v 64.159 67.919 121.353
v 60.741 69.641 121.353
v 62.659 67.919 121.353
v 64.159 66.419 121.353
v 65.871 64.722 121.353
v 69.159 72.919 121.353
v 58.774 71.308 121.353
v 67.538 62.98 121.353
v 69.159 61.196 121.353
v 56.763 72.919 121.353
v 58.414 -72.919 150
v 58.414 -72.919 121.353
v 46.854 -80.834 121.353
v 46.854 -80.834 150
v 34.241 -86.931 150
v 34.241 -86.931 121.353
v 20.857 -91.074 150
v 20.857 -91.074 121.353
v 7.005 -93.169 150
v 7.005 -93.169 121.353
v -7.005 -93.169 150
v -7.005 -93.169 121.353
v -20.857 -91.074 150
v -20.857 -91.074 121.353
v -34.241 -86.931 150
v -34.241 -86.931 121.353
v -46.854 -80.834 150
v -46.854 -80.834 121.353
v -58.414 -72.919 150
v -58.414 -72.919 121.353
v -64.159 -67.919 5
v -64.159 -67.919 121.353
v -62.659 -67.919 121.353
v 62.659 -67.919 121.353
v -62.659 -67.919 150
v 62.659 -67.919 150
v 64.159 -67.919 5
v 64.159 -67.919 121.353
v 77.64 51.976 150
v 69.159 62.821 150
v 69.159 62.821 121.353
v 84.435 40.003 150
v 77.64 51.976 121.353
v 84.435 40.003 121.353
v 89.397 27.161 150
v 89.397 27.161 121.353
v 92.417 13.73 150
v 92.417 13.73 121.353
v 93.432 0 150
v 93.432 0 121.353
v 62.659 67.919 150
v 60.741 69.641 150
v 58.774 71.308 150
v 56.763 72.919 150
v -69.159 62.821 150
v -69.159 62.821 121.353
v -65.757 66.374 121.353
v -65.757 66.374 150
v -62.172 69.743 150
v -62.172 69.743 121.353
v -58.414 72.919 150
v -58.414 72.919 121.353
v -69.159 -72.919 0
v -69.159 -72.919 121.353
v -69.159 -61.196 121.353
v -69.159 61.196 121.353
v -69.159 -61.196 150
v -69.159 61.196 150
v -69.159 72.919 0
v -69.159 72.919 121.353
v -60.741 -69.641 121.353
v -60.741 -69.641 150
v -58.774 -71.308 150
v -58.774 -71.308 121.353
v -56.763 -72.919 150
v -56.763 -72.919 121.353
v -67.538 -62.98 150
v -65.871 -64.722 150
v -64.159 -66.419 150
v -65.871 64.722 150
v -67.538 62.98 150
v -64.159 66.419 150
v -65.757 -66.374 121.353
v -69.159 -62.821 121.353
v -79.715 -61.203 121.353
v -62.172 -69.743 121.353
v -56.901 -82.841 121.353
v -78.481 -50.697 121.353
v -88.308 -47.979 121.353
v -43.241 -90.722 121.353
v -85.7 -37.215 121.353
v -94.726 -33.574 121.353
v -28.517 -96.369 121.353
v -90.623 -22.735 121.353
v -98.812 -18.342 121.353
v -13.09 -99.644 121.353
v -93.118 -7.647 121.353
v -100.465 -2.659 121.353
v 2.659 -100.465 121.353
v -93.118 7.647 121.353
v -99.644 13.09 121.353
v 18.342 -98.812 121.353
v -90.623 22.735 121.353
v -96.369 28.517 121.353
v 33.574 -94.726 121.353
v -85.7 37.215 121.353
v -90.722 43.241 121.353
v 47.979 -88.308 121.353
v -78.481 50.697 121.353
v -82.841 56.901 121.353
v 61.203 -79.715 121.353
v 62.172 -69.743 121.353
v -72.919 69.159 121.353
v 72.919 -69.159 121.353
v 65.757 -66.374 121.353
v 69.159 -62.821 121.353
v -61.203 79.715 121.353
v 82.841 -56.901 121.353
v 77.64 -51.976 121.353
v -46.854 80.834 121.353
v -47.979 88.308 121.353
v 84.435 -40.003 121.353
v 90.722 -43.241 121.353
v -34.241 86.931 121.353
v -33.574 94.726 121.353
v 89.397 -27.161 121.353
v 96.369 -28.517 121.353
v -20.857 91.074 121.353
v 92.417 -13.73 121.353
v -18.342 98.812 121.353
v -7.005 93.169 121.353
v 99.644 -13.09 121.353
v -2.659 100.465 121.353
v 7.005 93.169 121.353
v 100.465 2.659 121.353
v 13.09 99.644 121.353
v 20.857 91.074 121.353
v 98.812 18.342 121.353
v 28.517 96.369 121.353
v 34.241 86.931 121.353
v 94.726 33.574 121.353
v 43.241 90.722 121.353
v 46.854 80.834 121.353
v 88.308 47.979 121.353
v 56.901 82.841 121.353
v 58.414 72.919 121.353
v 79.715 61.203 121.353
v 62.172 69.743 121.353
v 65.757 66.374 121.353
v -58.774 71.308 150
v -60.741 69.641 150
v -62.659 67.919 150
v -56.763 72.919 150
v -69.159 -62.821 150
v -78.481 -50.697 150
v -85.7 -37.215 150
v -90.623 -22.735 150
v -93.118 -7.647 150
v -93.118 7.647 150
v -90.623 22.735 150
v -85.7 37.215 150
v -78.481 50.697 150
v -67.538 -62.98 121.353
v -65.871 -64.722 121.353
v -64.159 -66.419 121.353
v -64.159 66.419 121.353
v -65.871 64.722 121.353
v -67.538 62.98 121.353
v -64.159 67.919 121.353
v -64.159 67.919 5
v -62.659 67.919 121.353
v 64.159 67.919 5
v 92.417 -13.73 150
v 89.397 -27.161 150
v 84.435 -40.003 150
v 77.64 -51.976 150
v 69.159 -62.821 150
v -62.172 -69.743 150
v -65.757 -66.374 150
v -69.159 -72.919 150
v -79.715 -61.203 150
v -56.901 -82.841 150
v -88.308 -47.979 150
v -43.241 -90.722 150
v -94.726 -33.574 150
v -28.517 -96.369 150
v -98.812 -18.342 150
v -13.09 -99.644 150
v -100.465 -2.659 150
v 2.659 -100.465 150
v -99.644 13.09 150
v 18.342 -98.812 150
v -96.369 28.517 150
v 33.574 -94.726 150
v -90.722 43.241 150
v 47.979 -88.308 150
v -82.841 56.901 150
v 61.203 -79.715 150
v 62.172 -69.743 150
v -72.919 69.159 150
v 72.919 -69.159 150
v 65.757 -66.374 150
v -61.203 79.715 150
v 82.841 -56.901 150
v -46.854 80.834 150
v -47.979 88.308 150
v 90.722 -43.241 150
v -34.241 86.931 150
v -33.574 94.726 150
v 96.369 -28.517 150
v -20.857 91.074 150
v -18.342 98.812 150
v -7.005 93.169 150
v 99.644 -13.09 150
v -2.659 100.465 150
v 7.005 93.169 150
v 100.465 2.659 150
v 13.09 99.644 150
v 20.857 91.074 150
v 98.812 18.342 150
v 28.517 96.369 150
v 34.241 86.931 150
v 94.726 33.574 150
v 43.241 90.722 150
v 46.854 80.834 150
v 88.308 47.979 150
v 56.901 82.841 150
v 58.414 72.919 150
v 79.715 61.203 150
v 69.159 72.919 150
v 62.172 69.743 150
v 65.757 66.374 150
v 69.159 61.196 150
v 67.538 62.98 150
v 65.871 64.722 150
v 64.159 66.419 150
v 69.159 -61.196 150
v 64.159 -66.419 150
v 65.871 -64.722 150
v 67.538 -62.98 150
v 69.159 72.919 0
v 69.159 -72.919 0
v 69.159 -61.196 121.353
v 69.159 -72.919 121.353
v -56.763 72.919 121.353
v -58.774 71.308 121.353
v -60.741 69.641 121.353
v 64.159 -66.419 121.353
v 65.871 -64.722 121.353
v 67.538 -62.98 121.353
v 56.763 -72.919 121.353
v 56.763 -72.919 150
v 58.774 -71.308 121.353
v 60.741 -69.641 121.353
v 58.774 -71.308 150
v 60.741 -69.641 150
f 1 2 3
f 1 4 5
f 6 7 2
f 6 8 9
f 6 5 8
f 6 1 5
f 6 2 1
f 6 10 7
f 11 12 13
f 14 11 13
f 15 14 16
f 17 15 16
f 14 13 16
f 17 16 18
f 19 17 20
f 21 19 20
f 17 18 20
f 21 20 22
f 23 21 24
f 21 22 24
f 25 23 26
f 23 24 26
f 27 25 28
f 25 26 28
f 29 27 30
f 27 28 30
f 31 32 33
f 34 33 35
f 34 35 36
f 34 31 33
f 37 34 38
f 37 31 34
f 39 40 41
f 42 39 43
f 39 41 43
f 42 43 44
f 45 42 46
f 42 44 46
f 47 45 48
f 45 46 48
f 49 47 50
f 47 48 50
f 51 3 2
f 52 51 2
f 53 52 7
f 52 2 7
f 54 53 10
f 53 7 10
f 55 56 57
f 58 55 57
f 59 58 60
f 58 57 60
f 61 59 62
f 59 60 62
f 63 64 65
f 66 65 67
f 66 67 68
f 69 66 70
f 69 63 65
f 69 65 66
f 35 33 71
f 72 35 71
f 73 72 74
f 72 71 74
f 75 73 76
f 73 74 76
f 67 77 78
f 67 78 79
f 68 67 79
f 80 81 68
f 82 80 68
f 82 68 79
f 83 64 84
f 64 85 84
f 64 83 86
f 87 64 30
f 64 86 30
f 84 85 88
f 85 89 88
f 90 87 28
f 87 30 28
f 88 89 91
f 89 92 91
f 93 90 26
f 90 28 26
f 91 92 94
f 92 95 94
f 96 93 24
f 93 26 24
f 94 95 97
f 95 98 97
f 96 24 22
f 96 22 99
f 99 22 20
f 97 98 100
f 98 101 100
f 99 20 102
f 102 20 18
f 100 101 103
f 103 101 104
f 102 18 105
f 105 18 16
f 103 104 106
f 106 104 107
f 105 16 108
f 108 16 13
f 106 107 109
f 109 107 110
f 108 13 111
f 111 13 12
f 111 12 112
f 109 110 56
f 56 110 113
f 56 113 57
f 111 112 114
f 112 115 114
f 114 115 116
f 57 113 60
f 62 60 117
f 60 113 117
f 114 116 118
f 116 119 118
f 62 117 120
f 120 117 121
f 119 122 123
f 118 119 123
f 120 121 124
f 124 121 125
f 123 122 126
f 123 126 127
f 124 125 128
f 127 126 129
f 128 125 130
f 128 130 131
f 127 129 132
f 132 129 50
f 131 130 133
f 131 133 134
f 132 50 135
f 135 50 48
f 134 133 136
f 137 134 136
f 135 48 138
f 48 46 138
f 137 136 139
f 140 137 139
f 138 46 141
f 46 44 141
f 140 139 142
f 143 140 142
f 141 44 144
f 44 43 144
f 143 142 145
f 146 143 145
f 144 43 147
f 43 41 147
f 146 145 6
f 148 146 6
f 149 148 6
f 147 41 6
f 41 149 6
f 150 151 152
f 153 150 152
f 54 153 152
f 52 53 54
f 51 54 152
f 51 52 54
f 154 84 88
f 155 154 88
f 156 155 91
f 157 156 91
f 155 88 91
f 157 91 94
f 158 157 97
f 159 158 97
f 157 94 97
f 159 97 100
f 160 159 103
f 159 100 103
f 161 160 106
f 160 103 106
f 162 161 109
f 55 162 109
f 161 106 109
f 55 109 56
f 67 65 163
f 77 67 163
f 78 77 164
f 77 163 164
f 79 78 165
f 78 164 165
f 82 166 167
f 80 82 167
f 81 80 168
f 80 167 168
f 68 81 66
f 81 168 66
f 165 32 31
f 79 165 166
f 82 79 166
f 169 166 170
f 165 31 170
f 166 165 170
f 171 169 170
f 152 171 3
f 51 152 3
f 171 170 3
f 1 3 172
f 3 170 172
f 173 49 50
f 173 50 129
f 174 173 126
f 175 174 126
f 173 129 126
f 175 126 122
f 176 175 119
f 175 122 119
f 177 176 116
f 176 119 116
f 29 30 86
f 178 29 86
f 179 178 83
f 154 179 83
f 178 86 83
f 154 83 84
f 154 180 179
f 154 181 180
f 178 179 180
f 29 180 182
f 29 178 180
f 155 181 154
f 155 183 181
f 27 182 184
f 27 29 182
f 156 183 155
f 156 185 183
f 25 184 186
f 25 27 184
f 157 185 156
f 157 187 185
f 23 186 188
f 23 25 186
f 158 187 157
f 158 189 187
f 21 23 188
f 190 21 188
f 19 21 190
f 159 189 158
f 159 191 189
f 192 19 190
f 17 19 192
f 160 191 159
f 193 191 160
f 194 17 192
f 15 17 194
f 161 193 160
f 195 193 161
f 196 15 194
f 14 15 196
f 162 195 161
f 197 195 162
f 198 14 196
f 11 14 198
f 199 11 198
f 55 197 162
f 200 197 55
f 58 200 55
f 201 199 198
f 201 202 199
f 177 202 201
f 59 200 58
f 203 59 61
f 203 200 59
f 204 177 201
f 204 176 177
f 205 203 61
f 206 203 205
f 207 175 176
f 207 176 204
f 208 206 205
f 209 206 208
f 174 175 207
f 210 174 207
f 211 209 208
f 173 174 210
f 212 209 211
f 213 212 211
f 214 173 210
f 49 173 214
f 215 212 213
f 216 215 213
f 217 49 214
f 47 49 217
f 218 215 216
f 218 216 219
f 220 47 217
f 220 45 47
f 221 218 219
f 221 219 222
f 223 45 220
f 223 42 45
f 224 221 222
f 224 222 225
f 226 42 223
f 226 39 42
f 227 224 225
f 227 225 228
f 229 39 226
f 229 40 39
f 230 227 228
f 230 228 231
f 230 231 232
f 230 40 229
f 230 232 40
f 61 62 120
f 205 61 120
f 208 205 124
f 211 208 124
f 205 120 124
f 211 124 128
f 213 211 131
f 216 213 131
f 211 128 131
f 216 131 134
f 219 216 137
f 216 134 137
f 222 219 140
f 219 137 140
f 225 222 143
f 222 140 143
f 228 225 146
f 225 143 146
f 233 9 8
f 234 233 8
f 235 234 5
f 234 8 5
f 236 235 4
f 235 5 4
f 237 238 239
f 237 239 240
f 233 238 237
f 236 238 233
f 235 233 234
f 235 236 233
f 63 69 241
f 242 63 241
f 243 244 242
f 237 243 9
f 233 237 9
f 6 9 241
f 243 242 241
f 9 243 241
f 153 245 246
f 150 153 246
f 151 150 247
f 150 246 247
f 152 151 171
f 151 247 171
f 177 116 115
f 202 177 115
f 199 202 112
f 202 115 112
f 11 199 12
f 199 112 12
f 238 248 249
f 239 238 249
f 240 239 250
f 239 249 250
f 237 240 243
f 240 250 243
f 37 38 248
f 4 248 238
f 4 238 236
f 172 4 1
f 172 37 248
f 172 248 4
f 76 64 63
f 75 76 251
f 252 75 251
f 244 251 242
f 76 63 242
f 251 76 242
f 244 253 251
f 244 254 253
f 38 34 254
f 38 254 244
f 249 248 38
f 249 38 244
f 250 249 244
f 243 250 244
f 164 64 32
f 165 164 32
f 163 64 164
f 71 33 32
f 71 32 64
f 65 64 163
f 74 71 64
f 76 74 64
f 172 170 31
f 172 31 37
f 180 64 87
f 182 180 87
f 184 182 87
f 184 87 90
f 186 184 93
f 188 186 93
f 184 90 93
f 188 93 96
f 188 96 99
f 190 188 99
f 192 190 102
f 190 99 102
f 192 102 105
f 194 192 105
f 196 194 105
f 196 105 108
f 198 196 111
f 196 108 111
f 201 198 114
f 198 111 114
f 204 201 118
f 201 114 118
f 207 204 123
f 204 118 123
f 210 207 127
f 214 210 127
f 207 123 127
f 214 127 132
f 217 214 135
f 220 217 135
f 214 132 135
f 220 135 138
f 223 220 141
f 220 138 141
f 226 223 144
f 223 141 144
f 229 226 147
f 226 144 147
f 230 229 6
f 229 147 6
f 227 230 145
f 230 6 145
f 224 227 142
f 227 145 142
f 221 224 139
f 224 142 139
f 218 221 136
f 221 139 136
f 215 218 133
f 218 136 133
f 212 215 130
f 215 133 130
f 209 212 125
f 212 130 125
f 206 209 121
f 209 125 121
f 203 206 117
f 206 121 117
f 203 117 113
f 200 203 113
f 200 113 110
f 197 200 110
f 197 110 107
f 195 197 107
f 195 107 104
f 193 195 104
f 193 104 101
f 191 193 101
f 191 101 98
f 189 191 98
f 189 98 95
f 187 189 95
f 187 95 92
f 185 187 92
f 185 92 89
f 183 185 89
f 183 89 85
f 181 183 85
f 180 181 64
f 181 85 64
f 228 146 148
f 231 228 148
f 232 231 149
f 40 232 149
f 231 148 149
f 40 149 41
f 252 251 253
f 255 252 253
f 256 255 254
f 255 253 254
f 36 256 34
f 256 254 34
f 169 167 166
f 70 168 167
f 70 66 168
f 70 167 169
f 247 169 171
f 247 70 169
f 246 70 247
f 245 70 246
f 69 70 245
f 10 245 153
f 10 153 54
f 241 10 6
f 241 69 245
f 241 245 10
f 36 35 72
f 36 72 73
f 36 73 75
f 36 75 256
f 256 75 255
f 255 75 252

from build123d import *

# Parameters (mm, degrees)
F3_W     = 128.3186668592
F3_H     = 135.8387685024
F4_DEPTH = 5
F3_W_2   = 138.3186668592
F3_H_2   = 145.8387685024
F5_DEPTH = 121.3525491577
F8_DEPTH = 28.6474508423
F9_DEPTH = 28.6474508423


with BuildPart() as f4:
    # F3 (on Top) → F4 (new body)
    with BuildSketch(Plane.XY):
        Rectangle(F3_W, F3_H)
    extrude(amount=F4_DEPTH)

    # F3 (on Top) → F5 (join)
    with BuildSketch(Plane.XY):
        Rectangle(F3_W_2, F3_H_2)
        Rectangle(F3_W, F3_H, mode=Mode.SUBTRACT)
    extrude(amount=F5_DEPTH)

    # F6 (on face) → F9 (join)
    with BuildSketch(Plane.XY.offset(121.3525491577)):
        with BuildLine():
            Line((69.1593334296, 0), (69.1593334296, 61.1959252729))
            ThreePointArc((69.1593334296, 61.1959252729), (66.7104779192, 63.8566112962), (64.1593334296, 66.4193842512))
            Line((64.1593334296, 66.4193842512), (64.1593334296, 0))
            Line((64.1593334296, 0), (64.1593334296, -66.4193842512))
            ThreePointArc((64.1593334296, -66.4193842512), (66.7104779192, -63.8566112962), (69.1593334296, -61.1959252729))
            Line((69.1593334296, -61.1959252729), (69.1593334296, 0))
        make_face()
        with BuildLine():
            ThreePointArc((62.6593334296, 67.9193842512), (59.7633032908, 70.4810783309), (56.7626481353, 72.9193842512))
            Line((56.7626481353, 72.9193842512), (0, 72.9193842512))
            Line((0, 72.9193842512), (-56.7626481353, 72.9193842512))
            ThreePointArc((-56.7626481353, 72.9193842512), (-59.7633032908, 70.4810783309), (-62.6593334296, 67.9193842512))
            Line((-62.6593334296, 67.9193842512), (0, 67.9193842512))
            Line((0, 67.9193842512), (62.6593334296, 67.9193842512))
        make_face()
        with BuildLine():
            ThreePointArc((-64.1593334296, 66.4193842512), (-66.7104779192, 63.8566112962), (-69.1593334296, 61.1959252729))
            Line((-69.1593334296, 61.1959252729), (-69.1593334296, 0))
            Line((-69.1593334296, 0), (-69.1593334296, -61.1959252729))
            ThreePointArc((-69.1593334296, -61.1959252729), (-66.7104779192, -63.8566112962), (-64.1593334296, -66.4193842512))
            Line((-64.1593334296, -66.4193842512), (-64.1593334296, 0))
            Line((-64.1593334296, 0), (-64.1593334296, 66.4193842512))
        make_face()
        with BuildLine():
            Line((0, -72.9193842512), (56.7626481353, -72.9193842512))
            ThreePointArc((56.7626481353, -72.9193842512), (59.7633032908, -70.4810783309), (62.6593334296, -67.9193842512))
            Line((62.6593334296, -67.9193842512), (0, -67.9193842512))
            Line((0, -67.9193842512), (-62.6593334296, -67.9193842512))
            ThreePointArc((-62.6593334296, -67.9193842512), (-59.7633032908, -70.4810783309), (-56.7626481353, -72.9193842512))
            Line((-56.7626481353, -72.9193842512), (0, -72.9193842512))
        make_face()
    extrude(amount=F9_DEPTH)


with BuildPart() as f8:
    # F7 (on face) → F8 (new body)
    with BuildSketch(Plane.XY.offset(121.3525491577)):
        with BuildLine():
            ThreePointArc((-58.4142638713, -72.9193842512), (-61.3377672305, -70.4779478587), (-64.1593334296, -67.9193842512))
            ThreePointArc((-64.1593334296, -67.9193842512), (-66.708063189, -65.4178655167), (-69.1593334296, -62.8207722235))
            Line((-69.1593334296, -62.8207722235), (-69.1593334296, -72.9193842512))
            Line((-69.1593334296, -72.9193842512), (-58.4142638713, -72.9193842512))
        make_face()
        with BuildLine():
            Line((-69.1593334296, 62.8207722235), (-69.1593334296, 72.9193842512))
            ThreePointArc((-69.1593334296, 72.9193842512), (-100.5, 0), (-69.1593334296, -72.9193842512))
            Line((-69.1593334296, -72.9193842512), (-69.1593334296, -62.8207722235))
            ThreePointArc((-69.1593334296, -62.8207722235), (-93.4315943522, 0), (-69.1593334296, 62.8207722235))
        make_face()
        with BuildLine():
            ThreePointArc((64.1593334296, 67.9193842512), (66.708063189, 65.4178655167), (69.1593334296, 62.8207722235))
            Line((69.1593334296, 62.8207722235), (69.1593334296, 72.9193842512))
            Line((69.1593334296, 72.9193842512), (58.4142638713, 72.9193842512))
            ThreePointArc((58.4142638713, 72.9193842512), (61.3377672305, 70.4779478587), (64.1593334296, 67.9193842512))
        make_face()
        with BuildLine():
            ThreePointArc((-69.1593334296, 62.8207722235), (-66.708063189, 65.4178655167), (-64.1593334296, 67.9193842512))
            ThreePointArc((-64.1593334296, 67.9193842512), (-61.3377672305, 70.4779478587), (-58.4142638713, 72.9193842512))
            Line((-58.4142638713, 72.9193842512), (-69.1593334296, 72.9193842512))
            Line((-69.1593334296, 72.9193842512), (-69.1593334296, 62.8207722235))
        make_face()
        with BuildLine():
            Line((58.4142638713, 72.9193842512), (69.1593334296, 72.9193842512))
            ThreePointArc((69.1593334296, 72.9193842512), (0, 100.5), (-69.1593334296, 72.9193842512))
            Line((-69.1593334296, 72.9193842512), (-58.4142638713, 72.9193842512))
            ThreePointArc((-58.4142638713, 72.9193842512), (0, 93.4315943522), (58.4142638713, 72.9193842512))
        make_face()
        with BuildLine():
            ThreePointArc((69.1593334296, 62.8207722235), (87.1525375702, 33.6734022377), (93.4315943522, 0))
            ThreePointArc((93.4315943522, 0), (87.1525375702, -33.6734022377), (69.1593334296, -62.8207722235))
            Line((69.1593334296, -62.8207722235), (69.1593334296, -72.9193842512))
            ThreePointArc((69.1593334296, -72.9193842512), (92.3329925045, -39.6846128262), (100.5, 0))
            ThreePointArc((100.5, 0), (92.3329925045, 39.6846128262), (69.1593334296, 72.9193842512))
            Line((69.1593334296, 72.9193842512), (69.1593334296, 62.8207722235))
        make_face()
        with BuildLine():
            Line((69.1593334296, -72.9193842512), (69.1593334296, -62.8207722235))
            ThreePointArc((69.1593334296, -62.8207722235), (66.708063189, -65.4178655167), (64.1593334296, -67.9193842512))
            ThreePointArc((64.1593334296, -67.9193842512), (61.3377672305, -70.4779478587), (58.4142638713, -72.9193842512))
            Line((58.4142638713, -72.9193842512), (69.1593334296, -72.9193842512))
        make_face()
        with BuildLine():
            ThreePointArc((-69.1593334296, -72.9193842512), (0, -100.5), (69.1593334296, -72.9193842512))
            Line((69.1593334296, -72.9193842512), (58.4142638713, -72.9193842512))
            ThreePointArc((58.4142638713, -72.9193842512), (0, -93.4315943522), (-58.4142638713, -72.9193842512))
            Line((-58.4142638713, -72.9193842512), (-69.1593334296, -72.9193842512))
        make_face()
    extrude(amount=F8_DEPTH)


solid = Compound([f4.part, f8.part])
